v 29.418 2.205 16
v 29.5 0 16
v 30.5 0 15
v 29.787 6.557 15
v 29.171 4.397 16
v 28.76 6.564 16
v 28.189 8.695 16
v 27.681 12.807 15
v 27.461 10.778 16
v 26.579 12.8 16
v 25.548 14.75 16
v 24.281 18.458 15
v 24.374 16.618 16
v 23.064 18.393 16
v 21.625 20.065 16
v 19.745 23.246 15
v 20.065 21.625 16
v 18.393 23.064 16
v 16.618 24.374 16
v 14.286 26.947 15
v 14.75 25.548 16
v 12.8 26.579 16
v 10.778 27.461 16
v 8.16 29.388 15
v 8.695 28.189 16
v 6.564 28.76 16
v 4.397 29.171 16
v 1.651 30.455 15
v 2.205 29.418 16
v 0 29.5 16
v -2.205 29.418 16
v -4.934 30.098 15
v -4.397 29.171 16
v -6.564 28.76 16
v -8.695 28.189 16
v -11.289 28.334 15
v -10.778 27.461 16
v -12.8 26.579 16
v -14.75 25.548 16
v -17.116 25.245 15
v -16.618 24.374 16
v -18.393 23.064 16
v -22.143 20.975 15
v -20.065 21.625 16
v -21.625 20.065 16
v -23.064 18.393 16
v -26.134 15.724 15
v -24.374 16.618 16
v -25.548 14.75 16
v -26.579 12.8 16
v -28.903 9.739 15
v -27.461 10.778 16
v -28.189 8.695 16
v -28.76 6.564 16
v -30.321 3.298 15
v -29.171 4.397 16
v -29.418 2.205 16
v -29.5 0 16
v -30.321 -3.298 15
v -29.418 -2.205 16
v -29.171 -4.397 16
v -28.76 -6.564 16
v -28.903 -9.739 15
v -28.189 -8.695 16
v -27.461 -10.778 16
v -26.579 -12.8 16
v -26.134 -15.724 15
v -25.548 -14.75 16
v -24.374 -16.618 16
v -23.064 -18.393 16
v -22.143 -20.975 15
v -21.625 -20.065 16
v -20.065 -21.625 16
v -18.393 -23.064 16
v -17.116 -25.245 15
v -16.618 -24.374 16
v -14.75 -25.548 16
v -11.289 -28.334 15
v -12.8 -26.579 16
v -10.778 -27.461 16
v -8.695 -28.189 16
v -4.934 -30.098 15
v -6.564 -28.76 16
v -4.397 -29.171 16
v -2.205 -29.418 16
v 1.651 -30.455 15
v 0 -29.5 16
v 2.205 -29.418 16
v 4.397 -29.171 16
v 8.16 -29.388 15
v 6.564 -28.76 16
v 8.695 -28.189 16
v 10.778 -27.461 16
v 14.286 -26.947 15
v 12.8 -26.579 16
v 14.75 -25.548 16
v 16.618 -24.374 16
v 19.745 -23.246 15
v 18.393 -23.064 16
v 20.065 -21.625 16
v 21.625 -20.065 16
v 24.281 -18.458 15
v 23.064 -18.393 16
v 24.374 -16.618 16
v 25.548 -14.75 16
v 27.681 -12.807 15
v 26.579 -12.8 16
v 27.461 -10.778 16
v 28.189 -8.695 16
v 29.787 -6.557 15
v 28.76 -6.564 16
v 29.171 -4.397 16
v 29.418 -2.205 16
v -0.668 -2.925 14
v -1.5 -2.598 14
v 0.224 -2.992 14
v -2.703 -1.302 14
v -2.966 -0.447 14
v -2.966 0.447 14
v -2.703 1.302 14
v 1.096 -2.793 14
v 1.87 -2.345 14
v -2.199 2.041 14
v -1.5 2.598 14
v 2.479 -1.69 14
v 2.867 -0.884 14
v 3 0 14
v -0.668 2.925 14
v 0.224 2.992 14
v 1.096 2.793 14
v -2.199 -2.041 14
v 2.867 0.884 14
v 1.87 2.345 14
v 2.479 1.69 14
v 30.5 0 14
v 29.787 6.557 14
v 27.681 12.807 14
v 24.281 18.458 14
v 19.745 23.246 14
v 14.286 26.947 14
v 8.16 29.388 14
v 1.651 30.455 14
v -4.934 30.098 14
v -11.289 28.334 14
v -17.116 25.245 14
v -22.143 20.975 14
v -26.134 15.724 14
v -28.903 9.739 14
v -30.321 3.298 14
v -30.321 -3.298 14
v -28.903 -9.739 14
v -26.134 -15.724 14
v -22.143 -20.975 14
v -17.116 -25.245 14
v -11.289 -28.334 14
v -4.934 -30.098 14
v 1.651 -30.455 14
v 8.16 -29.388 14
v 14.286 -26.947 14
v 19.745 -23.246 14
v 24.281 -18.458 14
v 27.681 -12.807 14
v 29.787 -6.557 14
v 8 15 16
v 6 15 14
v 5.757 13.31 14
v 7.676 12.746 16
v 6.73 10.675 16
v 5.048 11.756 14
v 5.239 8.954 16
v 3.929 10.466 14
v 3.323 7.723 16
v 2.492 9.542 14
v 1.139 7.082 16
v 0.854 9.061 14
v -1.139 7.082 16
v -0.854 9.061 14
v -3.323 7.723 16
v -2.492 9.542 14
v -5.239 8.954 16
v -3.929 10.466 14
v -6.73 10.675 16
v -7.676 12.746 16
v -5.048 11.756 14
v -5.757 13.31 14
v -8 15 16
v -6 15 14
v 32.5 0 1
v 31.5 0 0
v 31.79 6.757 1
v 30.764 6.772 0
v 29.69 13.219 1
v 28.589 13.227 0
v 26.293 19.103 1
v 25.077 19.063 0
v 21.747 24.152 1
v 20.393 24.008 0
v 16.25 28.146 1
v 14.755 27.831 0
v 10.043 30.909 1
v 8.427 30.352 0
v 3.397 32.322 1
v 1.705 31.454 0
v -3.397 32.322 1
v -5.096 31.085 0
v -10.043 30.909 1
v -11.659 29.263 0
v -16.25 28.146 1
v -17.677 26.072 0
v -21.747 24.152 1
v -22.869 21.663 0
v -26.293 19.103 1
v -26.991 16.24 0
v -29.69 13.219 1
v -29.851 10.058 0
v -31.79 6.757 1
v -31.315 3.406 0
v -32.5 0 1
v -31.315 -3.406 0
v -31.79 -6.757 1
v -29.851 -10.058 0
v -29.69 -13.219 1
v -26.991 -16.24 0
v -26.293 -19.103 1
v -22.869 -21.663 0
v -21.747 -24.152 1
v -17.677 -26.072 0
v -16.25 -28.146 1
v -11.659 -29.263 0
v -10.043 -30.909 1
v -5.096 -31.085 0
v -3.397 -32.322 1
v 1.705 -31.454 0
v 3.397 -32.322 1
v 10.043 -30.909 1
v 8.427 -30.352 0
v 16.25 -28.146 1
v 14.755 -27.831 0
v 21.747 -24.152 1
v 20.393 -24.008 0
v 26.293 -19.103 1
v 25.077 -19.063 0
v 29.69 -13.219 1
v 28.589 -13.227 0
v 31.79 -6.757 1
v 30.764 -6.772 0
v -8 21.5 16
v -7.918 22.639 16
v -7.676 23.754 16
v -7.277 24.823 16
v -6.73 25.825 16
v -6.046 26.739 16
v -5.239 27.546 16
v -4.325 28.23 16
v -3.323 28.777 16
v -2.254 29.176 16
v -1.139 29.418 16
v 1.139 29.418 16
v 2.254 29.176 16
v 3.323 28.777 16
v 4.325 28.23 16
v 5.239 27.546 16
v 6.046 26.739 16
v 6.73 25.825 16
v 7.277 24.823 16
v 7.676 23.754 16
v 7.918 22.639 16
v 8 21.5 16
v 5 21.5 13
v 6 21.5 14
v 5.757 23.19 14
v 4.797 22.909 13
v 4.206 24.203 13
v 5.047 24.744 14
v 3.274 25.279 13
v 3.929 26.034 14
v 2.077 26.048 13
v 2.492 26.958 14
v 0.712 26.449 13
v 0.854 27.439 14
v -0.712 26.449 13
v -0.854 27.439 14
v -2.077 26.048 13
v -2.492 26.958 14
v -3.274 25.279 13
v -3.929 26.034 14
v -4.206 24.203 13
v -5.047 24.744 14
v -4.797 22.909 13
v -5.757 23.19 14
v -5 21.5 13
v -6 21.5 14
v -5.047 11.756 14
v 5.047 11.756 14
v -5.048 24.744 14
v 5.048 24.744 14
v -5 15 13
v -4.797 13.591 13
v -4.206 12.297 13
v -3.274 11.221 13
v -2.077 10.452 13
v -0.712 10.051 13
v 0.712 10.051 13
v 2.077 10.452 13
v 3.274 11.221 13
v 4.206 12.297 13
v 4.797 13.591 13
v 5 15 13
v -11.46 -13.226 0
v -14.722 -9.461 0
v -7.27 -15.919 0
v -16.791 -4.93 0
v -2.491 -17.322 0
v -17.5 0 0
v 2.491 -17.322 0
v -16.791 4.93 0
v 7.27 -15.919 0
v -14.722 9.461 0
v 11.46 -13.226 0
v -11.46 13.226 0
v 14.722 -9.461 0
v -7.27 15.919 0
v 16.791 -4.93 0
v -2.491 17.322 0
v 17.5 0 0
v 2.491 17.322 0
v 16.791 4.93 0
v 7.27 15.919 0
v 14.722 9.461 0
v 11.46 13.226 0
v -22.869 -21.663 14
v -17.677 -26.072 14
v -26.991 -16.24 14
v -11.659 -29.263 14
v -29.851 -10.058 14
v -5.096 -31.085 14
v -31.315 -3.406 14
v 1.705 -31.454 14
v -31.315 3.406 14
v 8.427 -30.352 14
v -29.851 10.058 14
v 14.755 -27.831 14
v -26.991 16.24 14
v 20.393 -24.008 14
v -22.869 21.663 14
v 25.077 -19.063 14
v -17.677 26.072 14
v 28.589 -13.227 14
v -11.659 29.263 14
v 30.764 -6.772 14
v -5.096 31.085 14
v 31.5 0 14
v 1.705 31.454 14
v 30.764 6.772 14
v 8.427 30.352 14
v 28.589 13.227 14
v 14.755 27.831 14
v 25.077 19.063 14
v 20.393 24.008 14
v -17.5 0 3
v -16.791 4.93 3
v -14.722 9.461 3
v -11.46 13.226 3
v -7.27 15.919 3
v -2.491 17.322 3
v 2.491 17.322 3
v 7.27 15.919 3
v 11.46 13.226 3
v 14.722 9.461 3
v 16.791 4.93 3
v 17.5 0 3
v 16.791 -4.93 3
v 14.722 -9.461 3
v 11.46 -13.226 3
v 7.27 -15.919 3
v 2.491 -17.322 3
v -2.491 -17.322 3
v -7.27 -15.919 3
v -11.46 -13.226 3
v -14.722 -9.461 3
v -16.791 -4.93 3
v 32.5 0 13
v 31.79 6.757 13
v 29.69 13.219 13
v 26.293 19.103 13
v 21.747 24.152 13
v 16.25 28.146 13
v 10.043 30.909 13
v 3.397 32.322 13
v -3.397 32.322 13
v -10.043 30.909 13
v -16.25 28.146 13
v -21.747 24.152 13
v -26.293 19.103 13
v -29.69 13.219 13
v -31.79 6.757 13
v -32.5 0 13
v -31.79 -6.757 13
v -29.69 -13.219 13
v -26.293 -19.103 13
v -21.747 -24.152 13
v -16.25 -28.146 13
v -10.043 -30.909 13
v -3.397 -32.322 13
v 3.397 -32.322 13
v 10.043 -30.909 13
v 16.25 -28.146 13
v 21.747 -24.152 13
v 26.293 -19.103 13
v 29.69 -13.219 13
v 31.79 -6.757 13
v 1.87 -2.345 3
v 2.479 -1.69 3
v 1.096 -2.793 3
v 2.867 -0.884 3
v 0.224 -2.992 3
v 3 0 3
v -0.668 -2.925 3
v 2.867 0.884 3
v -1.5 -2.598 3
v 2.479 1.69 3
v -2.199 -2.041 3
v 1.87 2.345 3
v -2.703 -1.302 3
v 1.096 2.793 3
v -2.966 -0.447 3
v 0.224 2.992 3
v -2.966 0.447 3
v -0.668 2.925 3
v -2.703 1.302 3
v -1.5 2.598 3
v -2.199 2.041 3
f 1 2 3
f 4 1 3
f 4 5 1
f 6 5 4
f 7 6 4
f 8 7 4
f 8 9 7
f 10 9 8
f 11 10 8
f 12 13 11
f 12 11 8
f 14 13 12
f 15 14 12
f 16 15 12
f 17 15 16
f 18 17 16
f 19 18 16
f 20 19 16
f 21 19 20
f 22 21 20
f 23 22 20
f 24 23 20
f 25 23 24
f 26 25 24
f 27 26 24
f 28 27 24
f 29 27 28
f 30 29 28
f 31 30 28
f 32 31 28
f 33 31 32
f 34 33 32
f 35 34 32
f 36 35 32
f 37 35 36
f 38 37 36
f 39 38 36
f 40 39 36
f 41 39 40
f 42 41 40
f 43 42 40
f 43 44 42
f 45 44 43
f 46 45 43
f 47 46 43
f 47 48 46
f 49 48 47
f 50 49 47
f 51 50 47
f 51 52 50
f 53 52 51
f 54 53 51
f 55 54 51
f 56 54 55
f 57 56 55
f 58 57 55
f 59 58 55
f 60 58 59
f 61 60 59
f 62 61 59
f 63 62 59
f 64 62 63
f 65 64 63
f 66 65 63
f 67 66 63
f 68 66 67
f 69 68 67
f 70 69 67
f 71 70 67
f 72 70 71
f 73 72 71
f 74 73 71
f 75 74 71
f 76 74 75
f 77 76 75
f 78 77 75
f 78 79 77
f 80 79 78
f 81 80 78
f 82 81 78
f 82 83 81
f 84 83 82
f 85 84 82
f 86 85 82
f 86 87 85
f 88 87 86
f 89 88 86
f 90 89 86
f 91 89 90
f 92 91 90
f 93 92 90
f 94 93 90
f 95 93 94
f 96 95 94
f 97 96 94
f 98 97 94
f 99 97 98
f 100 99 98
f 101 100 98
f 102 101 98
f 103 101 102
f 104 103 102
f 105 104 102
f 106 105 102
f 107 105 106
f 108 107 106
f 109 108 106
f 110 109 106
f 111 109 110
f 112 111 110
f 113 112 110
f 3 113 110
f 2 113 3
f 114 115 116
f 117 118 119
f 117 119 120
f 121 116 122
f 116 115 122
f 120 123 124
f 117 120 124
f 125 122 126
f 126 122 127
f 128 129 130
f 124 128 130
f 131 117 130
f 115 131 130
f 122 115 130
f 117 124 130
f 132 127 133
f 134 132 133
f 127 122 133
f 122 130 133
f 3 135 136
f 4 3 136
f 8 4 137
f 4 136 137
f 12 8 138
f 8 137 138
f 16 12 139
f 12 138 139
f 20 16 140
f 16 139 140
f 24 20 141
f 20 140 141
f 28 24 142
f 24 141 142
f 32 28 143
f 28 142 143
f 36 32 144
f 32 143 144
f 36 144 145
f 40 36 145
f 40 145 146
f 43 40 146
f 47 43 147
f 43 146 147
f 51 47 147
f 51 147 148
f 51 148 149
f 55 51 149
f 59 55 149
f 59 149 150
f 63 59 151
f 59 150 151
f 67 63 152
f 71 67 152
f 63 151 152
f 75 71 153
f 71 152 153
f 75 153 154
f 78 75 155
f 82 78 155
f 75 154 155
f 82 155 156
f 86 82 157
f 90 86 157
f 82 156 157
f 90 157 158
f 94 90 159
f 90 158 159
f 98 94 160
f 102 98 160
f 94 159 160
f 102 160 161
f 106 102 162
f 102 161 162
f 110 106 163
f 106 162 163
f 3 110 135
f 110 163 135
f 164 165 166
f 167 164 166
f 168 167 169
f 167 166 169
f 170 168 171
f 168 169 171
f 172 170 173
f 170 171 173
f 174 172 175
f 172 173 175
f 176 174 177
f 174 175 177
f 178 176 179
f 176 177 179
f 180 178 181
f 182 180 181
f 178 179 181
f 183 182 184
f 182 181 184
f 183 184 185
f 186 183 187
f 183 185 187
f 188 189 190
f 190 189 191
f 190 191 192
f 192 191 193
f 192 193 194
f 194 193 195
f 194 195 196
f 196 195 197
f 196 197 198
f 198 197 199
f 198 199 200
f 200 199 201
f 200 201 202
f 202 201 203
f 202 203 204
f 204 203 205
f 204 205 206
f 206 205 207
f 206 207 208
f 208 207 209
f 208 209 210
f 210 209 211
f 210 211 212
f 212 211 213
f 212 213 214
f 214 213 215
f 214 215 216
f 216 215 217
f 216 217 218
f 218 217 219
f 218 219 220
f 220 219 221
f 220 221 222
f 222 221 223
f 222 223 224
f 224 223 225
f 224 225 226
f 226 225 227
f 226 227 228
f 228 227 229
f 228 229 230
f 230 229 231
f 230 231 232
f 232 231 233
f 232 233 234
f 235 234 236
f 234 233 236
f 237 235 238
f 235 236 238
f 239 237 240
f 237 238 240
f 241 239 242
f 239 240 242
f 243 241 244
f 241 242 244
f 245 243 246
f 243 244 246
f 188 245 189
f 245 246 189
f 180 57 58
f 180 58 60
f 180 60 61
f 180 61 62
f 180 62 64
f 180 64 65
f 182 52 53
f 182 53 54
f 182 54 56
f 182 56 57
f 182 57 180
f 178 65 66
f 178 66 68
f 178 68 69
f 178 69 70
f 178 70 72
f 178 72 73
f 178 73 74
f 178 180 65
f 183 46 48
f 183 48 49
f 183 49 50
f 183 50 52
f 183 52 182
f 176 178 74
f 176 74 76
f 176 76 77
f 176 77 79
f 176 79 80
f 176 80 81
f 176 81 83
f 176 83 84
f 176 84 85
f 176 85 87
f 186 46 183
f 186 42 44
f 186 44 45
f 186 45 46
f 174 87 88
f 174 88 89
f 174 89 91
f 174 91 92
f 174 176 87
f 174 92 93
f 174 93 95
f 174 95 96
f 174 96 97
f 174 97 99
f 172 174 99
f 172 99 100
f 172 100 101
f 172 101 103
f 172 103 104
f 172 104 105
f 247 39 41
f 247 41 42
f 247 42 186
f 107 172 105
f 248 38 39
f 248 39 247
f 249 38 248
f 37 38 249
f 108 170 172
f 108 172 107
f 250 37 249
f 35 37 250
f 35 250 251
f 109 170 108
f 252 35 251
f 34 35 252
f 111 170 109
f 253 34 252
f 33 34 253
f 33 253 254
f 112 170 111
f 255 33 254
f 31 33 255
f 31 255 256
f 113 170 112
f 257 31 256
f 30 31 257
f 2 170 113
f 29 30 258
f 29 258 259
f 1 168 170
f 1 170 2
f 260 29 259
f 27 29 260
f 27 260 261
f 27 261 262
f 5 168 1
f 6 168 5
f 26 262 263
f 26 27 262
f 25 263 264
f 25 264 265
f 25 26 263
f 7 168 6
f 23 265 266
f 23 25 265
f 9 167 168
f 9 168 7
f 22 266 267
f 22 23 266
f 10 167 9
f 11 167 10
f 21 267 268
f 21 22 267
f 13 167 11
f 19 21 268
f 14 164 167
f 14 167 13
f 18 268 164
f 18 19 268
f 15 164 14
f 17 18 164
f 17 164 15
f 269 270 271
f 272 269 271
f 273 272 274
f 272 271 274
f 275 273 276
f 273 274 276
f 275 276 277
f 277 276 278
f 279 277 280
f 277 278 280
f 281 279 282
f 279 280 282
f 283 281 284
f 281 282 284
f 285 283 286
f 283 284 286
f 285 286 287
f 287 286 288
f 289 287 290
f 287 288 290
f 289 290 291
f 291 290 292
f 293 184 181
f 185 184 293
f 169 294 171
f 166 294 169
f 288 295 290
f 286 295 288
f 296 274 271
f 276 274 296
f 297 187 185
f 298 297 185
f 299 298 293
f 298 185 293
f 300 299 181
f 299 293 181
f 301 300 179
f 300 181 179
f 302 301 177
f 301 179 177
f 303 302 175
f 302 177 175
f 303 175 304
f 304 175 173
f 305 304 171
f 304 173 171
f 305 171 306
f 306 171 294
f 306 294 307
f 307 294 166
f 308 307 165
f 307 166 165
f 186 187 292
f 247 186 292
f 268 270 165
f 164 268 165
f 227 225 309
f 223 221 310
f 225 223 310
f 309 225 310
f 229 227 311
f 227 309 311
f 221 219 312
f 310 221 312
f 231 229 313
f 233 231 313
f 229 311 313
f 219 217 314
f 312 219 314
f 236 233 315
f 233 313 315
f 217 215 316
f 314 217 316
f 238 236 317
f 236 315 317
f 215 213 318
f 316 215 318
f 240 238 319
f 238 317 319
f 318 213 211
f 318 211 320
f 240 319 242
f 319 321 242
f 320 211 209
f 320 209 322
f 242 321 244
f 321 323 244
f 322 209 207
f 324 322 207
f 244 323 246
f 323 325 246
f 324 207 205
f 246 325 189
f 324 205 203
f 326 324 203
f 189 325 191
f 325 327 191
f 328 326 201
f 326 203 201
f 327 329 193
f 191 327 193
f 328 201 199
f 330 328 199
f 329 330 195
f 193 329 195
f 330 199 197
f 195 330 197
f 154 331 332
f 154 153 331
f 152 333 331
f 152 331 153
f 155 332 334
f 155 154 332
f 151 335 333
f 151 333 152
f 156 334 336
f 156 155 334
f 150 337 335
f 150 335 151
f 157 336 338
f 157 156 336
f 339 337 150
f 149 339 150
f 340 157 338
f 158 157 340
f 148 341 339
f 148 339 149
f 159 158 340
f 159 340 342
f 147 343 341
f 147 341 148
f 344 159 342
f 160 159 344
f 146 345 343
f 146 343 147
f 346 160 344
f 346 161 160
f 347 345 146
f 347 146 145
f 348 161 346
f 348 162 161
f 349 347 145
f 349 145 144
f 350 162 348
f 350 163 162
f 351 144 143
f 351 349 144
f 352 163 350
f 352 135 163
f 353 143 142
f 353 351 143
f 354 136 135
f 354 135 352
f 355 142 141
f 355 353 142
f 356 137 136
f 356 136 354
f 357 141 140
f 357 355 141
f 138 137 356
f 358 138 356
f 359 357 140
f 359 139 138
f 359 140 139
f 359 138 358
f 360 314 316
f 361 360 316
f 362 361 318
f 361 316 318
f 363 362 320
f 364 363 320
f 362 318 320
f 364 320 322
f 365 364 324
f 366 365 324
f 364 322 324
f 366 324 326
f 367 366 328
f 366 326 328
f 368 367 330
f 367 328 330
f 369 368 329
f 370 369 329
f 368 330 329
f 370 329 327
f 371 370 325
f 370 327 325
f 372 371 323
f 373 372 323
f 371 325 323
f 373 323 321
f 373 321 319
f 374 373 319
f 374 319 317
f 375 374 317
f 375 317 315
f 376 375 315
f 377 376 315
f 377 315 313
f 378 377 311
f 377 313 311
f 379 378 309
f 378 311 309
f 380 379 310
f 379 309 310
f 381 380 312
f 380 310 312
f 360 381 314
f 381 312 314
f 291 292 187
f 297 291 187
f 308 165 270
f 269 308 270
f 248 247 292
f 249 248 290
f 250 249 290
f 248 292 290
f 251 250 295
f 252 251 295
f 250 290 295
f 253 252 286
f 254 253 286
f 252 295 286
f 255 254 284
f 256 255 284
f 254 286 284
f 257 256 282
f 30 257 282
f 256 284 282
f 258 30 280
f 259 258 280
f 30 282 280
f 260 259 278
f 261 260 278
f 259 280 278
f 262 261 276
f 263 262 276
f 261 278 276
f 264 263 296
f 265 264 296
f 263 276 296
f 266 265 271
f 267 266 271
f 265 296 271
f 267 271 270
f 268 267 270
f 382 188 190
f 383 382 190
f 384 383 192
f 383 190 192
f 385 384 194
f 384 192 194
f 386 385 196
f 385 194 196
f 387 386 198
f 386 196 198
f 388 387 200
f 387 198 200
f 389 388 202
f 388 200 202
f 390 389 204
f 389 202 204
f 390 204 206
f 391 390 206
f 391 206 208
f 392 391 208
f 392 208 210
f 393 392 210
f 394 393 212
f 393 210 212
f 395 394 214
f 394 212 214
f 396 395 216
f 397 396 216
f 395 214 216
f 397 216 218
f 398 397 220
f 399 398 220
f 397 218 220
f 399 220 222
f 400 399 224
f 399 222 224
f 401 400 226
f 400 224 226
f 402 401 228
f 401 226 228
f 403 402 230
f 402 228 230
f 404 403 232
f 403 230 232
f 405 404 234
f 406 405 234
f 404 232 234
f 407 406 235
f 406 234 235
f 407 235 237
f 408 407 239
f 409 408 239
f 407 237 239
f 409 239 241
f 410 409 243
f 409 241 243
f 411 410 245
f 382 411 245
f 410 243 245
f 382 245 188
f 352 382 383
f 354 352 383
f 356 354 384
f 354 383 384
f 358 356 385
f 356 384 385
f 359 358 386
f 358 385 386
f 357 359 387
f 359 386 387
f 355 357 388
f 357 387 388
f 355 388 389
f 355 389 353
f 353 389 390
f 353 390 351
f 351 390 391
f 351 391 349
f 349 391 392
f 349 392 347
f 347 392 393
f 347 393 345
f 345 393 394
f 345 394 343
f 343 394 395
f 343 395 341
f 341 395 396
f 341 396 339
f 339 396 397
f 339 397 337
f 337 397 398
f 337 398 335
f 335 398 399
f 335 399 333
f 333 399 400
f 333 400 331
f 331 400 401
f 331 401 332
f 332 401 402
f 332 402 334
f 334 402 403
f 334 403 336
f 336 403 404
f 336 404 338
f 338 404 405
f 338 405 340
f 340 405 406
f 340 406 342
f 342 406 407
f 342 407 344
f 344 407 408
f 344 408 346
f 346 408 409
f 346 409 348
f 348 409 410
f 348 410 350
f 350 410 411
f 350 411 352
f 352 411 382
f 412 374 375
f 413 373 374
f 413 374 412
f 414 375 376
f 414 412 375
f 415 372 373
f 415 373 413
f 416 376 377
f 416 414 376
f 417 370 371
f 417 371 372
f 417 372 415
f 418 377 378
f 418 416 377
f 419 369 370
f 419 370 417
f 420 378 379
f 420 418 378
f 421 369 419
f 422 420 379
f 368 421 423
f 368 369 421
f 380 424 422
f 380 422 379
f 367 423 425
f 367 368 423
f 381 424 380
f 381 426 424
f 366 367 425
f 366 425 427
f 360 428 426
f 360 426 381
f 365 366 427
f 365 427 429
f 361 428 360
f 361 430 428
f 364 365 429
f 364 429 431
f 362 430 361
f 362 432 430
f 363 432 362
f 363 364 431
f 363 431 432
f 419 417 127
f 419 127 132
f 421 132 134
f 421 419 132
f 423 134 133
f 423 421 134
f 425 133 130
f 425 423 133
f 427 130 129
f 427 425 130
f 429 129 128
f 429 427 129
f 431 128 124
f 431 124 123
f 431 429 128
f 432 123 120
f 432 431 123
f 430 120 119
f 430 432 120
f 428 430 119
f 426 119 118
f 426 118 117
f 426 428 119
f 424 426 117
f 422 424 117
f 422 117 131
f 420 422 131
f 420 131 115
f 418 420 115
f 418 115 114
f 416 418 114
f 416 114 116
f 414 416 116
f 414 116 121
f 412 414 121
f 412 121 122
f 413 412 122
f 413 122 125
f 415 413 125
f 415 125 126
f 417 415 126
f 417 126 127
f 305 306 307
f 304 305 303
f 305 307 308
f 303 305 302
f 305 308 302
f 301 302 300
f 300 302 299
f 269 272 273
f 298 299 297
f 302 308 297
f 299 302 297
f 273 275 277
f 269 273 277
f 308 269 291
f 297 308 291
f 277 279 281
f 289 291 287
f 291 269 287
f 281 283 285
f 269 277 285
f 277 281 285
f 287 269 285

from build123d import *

# Parameters (mm, degrees)
CROQUIS1_R              = 32.5
CROQUIS1_R_2            = 3
SALIENTE_EXTRUIR1_DEPTH = 14
CROQUIS2_R              = 17.5
CORTAR_EXTRUIR1_DEPTH   = 3
CROQUIS3_R              = 30.5
SALIENTE_EXTRUIR2_DEPTH = 2
CHAFL_N1_SIZE           = 1
CORTAR_EXTRUIR2_DEPTH   = 3
CHAFL_N2_SIZE           = 2
SALIENTE_EXTRUIR3_START = 1
SALIENTE_EXTRUIR3_DEPTH = 1
CHAFL_N3_SIZE           = 1


with BuildPart() as part:
    # Croquis1 → Saliente-Extruir1 (new body)
    with BuildSketch(Plane.XY):
        Circle(CROQUIS1_R)
        Circle(CROQUIS1_R_2, mode=Mode.SUBTRACT)
    extrude(amount=SALIENTE_EXTRUIR1_DEPTH)

    # Croquis2 → Cortar-Extruir1 (cut)
    with BuildSketch(Plane(origin=(0, 0, 0), x_dir=(-1, 0, 0), z_dir=(0, 0, -1))):
        Circle(CROQUIS2_R)
    extrude(amount=-CORTAR_EXTRUIR1_DEPTH, mode=Mode.SUBTRACT)

    # Croquis3 → Saliente-Extruir2 (add)
    with BuildSketch(Plane.XY.offset(14)):
        Circle(CROQUIS3_R)
    extrude(amount=SALIENTE_EXTRUIR2_DEPTH)

    # Chaflán1
    chafl_n1_edges = [part.edges().sort_by_distance(p)[0] for p in [
        (-30.5, 0, 16),
        (-32.5, 0, 0),
        (-32.5, 0, 14),
    ]]
    chamfer(chafl_n1_edges, length=CHAFL_N1_SIZE)

    # Croquis4 → Cortar-Extruir2 (cut)
    with BuildSketch(Plane.XY.offset(16)):
        with BuildLine():
            Line((6, 21.5), (6, 15))
            ThreePointArc((6, 15), (0, 9), (-6, 15))
            Line((-6, 15), (-6, 21.5))
            ThreePointArc((-6, 21.5), (0, 27.5), (6, 21.5))
        make_face()
    extrude(amount=-CORTAR_EXTRUIR2_DEPTH, mode=Mode.SUBTRACT)

    # Chaflán2
    chafl_n2_edges = [part.edges().sort_by_distance(p)[0] for p in [
        (0, 27.5, 16),
        (-6, 18.25, 16),
        (0, 9, 16),
        (6, 18.25, 16),
    ]]
    chamfer(chafl_n2_edges, length=CHAFL_N2_SIZE - 0.0001)  # a hair under: the kernel refuses the full size

    # Croquis5 → Saliente-Extruir3 (add)
    with BuildSketch(Plane.XY.offset(13).offset(SALIENTE_EXTRUIR3_START)):
        with BuildLine():
            Line((-6, 21.5), (-6, 15))
            ThreePointArc((-6, 15), (0, 9), (6, 15))
            Line((6, 15), (6, 21.5))
            ThreePointArc((6, 21.5), (0, 27.5), (-6, 21.5))
        make_face()
        with BuildLine():
            Line((5, 15), (5, 21.5))
            ThreePointArc((5, 21.5), (0, 26.5), (-5, 21.5))
            Line((-5, 21.5), (-5, 15))
            ThreePointArc((-5, 15), (0, 10), (5, 15))
        make_face(mode=Mode.SUBTRACT)
    extrude(amount=-SALIENTE_EXTRUIR3_DEPTH)

    # Chaflán3
    chafl_n3_edges = [part.edges().sort_by_distance(p)[0] for p in [
        (5, 18.25, 14),
        (0, 26.5, 14),
        (0, 10, 14),
        (-5, 18.25, 14),
    ]]
    chamfer(chafl_n3_edges, length=CHAFL_N3_SIZE - 0.0001)  # a hair under: the kernel refuses the full size


solid = part.part
